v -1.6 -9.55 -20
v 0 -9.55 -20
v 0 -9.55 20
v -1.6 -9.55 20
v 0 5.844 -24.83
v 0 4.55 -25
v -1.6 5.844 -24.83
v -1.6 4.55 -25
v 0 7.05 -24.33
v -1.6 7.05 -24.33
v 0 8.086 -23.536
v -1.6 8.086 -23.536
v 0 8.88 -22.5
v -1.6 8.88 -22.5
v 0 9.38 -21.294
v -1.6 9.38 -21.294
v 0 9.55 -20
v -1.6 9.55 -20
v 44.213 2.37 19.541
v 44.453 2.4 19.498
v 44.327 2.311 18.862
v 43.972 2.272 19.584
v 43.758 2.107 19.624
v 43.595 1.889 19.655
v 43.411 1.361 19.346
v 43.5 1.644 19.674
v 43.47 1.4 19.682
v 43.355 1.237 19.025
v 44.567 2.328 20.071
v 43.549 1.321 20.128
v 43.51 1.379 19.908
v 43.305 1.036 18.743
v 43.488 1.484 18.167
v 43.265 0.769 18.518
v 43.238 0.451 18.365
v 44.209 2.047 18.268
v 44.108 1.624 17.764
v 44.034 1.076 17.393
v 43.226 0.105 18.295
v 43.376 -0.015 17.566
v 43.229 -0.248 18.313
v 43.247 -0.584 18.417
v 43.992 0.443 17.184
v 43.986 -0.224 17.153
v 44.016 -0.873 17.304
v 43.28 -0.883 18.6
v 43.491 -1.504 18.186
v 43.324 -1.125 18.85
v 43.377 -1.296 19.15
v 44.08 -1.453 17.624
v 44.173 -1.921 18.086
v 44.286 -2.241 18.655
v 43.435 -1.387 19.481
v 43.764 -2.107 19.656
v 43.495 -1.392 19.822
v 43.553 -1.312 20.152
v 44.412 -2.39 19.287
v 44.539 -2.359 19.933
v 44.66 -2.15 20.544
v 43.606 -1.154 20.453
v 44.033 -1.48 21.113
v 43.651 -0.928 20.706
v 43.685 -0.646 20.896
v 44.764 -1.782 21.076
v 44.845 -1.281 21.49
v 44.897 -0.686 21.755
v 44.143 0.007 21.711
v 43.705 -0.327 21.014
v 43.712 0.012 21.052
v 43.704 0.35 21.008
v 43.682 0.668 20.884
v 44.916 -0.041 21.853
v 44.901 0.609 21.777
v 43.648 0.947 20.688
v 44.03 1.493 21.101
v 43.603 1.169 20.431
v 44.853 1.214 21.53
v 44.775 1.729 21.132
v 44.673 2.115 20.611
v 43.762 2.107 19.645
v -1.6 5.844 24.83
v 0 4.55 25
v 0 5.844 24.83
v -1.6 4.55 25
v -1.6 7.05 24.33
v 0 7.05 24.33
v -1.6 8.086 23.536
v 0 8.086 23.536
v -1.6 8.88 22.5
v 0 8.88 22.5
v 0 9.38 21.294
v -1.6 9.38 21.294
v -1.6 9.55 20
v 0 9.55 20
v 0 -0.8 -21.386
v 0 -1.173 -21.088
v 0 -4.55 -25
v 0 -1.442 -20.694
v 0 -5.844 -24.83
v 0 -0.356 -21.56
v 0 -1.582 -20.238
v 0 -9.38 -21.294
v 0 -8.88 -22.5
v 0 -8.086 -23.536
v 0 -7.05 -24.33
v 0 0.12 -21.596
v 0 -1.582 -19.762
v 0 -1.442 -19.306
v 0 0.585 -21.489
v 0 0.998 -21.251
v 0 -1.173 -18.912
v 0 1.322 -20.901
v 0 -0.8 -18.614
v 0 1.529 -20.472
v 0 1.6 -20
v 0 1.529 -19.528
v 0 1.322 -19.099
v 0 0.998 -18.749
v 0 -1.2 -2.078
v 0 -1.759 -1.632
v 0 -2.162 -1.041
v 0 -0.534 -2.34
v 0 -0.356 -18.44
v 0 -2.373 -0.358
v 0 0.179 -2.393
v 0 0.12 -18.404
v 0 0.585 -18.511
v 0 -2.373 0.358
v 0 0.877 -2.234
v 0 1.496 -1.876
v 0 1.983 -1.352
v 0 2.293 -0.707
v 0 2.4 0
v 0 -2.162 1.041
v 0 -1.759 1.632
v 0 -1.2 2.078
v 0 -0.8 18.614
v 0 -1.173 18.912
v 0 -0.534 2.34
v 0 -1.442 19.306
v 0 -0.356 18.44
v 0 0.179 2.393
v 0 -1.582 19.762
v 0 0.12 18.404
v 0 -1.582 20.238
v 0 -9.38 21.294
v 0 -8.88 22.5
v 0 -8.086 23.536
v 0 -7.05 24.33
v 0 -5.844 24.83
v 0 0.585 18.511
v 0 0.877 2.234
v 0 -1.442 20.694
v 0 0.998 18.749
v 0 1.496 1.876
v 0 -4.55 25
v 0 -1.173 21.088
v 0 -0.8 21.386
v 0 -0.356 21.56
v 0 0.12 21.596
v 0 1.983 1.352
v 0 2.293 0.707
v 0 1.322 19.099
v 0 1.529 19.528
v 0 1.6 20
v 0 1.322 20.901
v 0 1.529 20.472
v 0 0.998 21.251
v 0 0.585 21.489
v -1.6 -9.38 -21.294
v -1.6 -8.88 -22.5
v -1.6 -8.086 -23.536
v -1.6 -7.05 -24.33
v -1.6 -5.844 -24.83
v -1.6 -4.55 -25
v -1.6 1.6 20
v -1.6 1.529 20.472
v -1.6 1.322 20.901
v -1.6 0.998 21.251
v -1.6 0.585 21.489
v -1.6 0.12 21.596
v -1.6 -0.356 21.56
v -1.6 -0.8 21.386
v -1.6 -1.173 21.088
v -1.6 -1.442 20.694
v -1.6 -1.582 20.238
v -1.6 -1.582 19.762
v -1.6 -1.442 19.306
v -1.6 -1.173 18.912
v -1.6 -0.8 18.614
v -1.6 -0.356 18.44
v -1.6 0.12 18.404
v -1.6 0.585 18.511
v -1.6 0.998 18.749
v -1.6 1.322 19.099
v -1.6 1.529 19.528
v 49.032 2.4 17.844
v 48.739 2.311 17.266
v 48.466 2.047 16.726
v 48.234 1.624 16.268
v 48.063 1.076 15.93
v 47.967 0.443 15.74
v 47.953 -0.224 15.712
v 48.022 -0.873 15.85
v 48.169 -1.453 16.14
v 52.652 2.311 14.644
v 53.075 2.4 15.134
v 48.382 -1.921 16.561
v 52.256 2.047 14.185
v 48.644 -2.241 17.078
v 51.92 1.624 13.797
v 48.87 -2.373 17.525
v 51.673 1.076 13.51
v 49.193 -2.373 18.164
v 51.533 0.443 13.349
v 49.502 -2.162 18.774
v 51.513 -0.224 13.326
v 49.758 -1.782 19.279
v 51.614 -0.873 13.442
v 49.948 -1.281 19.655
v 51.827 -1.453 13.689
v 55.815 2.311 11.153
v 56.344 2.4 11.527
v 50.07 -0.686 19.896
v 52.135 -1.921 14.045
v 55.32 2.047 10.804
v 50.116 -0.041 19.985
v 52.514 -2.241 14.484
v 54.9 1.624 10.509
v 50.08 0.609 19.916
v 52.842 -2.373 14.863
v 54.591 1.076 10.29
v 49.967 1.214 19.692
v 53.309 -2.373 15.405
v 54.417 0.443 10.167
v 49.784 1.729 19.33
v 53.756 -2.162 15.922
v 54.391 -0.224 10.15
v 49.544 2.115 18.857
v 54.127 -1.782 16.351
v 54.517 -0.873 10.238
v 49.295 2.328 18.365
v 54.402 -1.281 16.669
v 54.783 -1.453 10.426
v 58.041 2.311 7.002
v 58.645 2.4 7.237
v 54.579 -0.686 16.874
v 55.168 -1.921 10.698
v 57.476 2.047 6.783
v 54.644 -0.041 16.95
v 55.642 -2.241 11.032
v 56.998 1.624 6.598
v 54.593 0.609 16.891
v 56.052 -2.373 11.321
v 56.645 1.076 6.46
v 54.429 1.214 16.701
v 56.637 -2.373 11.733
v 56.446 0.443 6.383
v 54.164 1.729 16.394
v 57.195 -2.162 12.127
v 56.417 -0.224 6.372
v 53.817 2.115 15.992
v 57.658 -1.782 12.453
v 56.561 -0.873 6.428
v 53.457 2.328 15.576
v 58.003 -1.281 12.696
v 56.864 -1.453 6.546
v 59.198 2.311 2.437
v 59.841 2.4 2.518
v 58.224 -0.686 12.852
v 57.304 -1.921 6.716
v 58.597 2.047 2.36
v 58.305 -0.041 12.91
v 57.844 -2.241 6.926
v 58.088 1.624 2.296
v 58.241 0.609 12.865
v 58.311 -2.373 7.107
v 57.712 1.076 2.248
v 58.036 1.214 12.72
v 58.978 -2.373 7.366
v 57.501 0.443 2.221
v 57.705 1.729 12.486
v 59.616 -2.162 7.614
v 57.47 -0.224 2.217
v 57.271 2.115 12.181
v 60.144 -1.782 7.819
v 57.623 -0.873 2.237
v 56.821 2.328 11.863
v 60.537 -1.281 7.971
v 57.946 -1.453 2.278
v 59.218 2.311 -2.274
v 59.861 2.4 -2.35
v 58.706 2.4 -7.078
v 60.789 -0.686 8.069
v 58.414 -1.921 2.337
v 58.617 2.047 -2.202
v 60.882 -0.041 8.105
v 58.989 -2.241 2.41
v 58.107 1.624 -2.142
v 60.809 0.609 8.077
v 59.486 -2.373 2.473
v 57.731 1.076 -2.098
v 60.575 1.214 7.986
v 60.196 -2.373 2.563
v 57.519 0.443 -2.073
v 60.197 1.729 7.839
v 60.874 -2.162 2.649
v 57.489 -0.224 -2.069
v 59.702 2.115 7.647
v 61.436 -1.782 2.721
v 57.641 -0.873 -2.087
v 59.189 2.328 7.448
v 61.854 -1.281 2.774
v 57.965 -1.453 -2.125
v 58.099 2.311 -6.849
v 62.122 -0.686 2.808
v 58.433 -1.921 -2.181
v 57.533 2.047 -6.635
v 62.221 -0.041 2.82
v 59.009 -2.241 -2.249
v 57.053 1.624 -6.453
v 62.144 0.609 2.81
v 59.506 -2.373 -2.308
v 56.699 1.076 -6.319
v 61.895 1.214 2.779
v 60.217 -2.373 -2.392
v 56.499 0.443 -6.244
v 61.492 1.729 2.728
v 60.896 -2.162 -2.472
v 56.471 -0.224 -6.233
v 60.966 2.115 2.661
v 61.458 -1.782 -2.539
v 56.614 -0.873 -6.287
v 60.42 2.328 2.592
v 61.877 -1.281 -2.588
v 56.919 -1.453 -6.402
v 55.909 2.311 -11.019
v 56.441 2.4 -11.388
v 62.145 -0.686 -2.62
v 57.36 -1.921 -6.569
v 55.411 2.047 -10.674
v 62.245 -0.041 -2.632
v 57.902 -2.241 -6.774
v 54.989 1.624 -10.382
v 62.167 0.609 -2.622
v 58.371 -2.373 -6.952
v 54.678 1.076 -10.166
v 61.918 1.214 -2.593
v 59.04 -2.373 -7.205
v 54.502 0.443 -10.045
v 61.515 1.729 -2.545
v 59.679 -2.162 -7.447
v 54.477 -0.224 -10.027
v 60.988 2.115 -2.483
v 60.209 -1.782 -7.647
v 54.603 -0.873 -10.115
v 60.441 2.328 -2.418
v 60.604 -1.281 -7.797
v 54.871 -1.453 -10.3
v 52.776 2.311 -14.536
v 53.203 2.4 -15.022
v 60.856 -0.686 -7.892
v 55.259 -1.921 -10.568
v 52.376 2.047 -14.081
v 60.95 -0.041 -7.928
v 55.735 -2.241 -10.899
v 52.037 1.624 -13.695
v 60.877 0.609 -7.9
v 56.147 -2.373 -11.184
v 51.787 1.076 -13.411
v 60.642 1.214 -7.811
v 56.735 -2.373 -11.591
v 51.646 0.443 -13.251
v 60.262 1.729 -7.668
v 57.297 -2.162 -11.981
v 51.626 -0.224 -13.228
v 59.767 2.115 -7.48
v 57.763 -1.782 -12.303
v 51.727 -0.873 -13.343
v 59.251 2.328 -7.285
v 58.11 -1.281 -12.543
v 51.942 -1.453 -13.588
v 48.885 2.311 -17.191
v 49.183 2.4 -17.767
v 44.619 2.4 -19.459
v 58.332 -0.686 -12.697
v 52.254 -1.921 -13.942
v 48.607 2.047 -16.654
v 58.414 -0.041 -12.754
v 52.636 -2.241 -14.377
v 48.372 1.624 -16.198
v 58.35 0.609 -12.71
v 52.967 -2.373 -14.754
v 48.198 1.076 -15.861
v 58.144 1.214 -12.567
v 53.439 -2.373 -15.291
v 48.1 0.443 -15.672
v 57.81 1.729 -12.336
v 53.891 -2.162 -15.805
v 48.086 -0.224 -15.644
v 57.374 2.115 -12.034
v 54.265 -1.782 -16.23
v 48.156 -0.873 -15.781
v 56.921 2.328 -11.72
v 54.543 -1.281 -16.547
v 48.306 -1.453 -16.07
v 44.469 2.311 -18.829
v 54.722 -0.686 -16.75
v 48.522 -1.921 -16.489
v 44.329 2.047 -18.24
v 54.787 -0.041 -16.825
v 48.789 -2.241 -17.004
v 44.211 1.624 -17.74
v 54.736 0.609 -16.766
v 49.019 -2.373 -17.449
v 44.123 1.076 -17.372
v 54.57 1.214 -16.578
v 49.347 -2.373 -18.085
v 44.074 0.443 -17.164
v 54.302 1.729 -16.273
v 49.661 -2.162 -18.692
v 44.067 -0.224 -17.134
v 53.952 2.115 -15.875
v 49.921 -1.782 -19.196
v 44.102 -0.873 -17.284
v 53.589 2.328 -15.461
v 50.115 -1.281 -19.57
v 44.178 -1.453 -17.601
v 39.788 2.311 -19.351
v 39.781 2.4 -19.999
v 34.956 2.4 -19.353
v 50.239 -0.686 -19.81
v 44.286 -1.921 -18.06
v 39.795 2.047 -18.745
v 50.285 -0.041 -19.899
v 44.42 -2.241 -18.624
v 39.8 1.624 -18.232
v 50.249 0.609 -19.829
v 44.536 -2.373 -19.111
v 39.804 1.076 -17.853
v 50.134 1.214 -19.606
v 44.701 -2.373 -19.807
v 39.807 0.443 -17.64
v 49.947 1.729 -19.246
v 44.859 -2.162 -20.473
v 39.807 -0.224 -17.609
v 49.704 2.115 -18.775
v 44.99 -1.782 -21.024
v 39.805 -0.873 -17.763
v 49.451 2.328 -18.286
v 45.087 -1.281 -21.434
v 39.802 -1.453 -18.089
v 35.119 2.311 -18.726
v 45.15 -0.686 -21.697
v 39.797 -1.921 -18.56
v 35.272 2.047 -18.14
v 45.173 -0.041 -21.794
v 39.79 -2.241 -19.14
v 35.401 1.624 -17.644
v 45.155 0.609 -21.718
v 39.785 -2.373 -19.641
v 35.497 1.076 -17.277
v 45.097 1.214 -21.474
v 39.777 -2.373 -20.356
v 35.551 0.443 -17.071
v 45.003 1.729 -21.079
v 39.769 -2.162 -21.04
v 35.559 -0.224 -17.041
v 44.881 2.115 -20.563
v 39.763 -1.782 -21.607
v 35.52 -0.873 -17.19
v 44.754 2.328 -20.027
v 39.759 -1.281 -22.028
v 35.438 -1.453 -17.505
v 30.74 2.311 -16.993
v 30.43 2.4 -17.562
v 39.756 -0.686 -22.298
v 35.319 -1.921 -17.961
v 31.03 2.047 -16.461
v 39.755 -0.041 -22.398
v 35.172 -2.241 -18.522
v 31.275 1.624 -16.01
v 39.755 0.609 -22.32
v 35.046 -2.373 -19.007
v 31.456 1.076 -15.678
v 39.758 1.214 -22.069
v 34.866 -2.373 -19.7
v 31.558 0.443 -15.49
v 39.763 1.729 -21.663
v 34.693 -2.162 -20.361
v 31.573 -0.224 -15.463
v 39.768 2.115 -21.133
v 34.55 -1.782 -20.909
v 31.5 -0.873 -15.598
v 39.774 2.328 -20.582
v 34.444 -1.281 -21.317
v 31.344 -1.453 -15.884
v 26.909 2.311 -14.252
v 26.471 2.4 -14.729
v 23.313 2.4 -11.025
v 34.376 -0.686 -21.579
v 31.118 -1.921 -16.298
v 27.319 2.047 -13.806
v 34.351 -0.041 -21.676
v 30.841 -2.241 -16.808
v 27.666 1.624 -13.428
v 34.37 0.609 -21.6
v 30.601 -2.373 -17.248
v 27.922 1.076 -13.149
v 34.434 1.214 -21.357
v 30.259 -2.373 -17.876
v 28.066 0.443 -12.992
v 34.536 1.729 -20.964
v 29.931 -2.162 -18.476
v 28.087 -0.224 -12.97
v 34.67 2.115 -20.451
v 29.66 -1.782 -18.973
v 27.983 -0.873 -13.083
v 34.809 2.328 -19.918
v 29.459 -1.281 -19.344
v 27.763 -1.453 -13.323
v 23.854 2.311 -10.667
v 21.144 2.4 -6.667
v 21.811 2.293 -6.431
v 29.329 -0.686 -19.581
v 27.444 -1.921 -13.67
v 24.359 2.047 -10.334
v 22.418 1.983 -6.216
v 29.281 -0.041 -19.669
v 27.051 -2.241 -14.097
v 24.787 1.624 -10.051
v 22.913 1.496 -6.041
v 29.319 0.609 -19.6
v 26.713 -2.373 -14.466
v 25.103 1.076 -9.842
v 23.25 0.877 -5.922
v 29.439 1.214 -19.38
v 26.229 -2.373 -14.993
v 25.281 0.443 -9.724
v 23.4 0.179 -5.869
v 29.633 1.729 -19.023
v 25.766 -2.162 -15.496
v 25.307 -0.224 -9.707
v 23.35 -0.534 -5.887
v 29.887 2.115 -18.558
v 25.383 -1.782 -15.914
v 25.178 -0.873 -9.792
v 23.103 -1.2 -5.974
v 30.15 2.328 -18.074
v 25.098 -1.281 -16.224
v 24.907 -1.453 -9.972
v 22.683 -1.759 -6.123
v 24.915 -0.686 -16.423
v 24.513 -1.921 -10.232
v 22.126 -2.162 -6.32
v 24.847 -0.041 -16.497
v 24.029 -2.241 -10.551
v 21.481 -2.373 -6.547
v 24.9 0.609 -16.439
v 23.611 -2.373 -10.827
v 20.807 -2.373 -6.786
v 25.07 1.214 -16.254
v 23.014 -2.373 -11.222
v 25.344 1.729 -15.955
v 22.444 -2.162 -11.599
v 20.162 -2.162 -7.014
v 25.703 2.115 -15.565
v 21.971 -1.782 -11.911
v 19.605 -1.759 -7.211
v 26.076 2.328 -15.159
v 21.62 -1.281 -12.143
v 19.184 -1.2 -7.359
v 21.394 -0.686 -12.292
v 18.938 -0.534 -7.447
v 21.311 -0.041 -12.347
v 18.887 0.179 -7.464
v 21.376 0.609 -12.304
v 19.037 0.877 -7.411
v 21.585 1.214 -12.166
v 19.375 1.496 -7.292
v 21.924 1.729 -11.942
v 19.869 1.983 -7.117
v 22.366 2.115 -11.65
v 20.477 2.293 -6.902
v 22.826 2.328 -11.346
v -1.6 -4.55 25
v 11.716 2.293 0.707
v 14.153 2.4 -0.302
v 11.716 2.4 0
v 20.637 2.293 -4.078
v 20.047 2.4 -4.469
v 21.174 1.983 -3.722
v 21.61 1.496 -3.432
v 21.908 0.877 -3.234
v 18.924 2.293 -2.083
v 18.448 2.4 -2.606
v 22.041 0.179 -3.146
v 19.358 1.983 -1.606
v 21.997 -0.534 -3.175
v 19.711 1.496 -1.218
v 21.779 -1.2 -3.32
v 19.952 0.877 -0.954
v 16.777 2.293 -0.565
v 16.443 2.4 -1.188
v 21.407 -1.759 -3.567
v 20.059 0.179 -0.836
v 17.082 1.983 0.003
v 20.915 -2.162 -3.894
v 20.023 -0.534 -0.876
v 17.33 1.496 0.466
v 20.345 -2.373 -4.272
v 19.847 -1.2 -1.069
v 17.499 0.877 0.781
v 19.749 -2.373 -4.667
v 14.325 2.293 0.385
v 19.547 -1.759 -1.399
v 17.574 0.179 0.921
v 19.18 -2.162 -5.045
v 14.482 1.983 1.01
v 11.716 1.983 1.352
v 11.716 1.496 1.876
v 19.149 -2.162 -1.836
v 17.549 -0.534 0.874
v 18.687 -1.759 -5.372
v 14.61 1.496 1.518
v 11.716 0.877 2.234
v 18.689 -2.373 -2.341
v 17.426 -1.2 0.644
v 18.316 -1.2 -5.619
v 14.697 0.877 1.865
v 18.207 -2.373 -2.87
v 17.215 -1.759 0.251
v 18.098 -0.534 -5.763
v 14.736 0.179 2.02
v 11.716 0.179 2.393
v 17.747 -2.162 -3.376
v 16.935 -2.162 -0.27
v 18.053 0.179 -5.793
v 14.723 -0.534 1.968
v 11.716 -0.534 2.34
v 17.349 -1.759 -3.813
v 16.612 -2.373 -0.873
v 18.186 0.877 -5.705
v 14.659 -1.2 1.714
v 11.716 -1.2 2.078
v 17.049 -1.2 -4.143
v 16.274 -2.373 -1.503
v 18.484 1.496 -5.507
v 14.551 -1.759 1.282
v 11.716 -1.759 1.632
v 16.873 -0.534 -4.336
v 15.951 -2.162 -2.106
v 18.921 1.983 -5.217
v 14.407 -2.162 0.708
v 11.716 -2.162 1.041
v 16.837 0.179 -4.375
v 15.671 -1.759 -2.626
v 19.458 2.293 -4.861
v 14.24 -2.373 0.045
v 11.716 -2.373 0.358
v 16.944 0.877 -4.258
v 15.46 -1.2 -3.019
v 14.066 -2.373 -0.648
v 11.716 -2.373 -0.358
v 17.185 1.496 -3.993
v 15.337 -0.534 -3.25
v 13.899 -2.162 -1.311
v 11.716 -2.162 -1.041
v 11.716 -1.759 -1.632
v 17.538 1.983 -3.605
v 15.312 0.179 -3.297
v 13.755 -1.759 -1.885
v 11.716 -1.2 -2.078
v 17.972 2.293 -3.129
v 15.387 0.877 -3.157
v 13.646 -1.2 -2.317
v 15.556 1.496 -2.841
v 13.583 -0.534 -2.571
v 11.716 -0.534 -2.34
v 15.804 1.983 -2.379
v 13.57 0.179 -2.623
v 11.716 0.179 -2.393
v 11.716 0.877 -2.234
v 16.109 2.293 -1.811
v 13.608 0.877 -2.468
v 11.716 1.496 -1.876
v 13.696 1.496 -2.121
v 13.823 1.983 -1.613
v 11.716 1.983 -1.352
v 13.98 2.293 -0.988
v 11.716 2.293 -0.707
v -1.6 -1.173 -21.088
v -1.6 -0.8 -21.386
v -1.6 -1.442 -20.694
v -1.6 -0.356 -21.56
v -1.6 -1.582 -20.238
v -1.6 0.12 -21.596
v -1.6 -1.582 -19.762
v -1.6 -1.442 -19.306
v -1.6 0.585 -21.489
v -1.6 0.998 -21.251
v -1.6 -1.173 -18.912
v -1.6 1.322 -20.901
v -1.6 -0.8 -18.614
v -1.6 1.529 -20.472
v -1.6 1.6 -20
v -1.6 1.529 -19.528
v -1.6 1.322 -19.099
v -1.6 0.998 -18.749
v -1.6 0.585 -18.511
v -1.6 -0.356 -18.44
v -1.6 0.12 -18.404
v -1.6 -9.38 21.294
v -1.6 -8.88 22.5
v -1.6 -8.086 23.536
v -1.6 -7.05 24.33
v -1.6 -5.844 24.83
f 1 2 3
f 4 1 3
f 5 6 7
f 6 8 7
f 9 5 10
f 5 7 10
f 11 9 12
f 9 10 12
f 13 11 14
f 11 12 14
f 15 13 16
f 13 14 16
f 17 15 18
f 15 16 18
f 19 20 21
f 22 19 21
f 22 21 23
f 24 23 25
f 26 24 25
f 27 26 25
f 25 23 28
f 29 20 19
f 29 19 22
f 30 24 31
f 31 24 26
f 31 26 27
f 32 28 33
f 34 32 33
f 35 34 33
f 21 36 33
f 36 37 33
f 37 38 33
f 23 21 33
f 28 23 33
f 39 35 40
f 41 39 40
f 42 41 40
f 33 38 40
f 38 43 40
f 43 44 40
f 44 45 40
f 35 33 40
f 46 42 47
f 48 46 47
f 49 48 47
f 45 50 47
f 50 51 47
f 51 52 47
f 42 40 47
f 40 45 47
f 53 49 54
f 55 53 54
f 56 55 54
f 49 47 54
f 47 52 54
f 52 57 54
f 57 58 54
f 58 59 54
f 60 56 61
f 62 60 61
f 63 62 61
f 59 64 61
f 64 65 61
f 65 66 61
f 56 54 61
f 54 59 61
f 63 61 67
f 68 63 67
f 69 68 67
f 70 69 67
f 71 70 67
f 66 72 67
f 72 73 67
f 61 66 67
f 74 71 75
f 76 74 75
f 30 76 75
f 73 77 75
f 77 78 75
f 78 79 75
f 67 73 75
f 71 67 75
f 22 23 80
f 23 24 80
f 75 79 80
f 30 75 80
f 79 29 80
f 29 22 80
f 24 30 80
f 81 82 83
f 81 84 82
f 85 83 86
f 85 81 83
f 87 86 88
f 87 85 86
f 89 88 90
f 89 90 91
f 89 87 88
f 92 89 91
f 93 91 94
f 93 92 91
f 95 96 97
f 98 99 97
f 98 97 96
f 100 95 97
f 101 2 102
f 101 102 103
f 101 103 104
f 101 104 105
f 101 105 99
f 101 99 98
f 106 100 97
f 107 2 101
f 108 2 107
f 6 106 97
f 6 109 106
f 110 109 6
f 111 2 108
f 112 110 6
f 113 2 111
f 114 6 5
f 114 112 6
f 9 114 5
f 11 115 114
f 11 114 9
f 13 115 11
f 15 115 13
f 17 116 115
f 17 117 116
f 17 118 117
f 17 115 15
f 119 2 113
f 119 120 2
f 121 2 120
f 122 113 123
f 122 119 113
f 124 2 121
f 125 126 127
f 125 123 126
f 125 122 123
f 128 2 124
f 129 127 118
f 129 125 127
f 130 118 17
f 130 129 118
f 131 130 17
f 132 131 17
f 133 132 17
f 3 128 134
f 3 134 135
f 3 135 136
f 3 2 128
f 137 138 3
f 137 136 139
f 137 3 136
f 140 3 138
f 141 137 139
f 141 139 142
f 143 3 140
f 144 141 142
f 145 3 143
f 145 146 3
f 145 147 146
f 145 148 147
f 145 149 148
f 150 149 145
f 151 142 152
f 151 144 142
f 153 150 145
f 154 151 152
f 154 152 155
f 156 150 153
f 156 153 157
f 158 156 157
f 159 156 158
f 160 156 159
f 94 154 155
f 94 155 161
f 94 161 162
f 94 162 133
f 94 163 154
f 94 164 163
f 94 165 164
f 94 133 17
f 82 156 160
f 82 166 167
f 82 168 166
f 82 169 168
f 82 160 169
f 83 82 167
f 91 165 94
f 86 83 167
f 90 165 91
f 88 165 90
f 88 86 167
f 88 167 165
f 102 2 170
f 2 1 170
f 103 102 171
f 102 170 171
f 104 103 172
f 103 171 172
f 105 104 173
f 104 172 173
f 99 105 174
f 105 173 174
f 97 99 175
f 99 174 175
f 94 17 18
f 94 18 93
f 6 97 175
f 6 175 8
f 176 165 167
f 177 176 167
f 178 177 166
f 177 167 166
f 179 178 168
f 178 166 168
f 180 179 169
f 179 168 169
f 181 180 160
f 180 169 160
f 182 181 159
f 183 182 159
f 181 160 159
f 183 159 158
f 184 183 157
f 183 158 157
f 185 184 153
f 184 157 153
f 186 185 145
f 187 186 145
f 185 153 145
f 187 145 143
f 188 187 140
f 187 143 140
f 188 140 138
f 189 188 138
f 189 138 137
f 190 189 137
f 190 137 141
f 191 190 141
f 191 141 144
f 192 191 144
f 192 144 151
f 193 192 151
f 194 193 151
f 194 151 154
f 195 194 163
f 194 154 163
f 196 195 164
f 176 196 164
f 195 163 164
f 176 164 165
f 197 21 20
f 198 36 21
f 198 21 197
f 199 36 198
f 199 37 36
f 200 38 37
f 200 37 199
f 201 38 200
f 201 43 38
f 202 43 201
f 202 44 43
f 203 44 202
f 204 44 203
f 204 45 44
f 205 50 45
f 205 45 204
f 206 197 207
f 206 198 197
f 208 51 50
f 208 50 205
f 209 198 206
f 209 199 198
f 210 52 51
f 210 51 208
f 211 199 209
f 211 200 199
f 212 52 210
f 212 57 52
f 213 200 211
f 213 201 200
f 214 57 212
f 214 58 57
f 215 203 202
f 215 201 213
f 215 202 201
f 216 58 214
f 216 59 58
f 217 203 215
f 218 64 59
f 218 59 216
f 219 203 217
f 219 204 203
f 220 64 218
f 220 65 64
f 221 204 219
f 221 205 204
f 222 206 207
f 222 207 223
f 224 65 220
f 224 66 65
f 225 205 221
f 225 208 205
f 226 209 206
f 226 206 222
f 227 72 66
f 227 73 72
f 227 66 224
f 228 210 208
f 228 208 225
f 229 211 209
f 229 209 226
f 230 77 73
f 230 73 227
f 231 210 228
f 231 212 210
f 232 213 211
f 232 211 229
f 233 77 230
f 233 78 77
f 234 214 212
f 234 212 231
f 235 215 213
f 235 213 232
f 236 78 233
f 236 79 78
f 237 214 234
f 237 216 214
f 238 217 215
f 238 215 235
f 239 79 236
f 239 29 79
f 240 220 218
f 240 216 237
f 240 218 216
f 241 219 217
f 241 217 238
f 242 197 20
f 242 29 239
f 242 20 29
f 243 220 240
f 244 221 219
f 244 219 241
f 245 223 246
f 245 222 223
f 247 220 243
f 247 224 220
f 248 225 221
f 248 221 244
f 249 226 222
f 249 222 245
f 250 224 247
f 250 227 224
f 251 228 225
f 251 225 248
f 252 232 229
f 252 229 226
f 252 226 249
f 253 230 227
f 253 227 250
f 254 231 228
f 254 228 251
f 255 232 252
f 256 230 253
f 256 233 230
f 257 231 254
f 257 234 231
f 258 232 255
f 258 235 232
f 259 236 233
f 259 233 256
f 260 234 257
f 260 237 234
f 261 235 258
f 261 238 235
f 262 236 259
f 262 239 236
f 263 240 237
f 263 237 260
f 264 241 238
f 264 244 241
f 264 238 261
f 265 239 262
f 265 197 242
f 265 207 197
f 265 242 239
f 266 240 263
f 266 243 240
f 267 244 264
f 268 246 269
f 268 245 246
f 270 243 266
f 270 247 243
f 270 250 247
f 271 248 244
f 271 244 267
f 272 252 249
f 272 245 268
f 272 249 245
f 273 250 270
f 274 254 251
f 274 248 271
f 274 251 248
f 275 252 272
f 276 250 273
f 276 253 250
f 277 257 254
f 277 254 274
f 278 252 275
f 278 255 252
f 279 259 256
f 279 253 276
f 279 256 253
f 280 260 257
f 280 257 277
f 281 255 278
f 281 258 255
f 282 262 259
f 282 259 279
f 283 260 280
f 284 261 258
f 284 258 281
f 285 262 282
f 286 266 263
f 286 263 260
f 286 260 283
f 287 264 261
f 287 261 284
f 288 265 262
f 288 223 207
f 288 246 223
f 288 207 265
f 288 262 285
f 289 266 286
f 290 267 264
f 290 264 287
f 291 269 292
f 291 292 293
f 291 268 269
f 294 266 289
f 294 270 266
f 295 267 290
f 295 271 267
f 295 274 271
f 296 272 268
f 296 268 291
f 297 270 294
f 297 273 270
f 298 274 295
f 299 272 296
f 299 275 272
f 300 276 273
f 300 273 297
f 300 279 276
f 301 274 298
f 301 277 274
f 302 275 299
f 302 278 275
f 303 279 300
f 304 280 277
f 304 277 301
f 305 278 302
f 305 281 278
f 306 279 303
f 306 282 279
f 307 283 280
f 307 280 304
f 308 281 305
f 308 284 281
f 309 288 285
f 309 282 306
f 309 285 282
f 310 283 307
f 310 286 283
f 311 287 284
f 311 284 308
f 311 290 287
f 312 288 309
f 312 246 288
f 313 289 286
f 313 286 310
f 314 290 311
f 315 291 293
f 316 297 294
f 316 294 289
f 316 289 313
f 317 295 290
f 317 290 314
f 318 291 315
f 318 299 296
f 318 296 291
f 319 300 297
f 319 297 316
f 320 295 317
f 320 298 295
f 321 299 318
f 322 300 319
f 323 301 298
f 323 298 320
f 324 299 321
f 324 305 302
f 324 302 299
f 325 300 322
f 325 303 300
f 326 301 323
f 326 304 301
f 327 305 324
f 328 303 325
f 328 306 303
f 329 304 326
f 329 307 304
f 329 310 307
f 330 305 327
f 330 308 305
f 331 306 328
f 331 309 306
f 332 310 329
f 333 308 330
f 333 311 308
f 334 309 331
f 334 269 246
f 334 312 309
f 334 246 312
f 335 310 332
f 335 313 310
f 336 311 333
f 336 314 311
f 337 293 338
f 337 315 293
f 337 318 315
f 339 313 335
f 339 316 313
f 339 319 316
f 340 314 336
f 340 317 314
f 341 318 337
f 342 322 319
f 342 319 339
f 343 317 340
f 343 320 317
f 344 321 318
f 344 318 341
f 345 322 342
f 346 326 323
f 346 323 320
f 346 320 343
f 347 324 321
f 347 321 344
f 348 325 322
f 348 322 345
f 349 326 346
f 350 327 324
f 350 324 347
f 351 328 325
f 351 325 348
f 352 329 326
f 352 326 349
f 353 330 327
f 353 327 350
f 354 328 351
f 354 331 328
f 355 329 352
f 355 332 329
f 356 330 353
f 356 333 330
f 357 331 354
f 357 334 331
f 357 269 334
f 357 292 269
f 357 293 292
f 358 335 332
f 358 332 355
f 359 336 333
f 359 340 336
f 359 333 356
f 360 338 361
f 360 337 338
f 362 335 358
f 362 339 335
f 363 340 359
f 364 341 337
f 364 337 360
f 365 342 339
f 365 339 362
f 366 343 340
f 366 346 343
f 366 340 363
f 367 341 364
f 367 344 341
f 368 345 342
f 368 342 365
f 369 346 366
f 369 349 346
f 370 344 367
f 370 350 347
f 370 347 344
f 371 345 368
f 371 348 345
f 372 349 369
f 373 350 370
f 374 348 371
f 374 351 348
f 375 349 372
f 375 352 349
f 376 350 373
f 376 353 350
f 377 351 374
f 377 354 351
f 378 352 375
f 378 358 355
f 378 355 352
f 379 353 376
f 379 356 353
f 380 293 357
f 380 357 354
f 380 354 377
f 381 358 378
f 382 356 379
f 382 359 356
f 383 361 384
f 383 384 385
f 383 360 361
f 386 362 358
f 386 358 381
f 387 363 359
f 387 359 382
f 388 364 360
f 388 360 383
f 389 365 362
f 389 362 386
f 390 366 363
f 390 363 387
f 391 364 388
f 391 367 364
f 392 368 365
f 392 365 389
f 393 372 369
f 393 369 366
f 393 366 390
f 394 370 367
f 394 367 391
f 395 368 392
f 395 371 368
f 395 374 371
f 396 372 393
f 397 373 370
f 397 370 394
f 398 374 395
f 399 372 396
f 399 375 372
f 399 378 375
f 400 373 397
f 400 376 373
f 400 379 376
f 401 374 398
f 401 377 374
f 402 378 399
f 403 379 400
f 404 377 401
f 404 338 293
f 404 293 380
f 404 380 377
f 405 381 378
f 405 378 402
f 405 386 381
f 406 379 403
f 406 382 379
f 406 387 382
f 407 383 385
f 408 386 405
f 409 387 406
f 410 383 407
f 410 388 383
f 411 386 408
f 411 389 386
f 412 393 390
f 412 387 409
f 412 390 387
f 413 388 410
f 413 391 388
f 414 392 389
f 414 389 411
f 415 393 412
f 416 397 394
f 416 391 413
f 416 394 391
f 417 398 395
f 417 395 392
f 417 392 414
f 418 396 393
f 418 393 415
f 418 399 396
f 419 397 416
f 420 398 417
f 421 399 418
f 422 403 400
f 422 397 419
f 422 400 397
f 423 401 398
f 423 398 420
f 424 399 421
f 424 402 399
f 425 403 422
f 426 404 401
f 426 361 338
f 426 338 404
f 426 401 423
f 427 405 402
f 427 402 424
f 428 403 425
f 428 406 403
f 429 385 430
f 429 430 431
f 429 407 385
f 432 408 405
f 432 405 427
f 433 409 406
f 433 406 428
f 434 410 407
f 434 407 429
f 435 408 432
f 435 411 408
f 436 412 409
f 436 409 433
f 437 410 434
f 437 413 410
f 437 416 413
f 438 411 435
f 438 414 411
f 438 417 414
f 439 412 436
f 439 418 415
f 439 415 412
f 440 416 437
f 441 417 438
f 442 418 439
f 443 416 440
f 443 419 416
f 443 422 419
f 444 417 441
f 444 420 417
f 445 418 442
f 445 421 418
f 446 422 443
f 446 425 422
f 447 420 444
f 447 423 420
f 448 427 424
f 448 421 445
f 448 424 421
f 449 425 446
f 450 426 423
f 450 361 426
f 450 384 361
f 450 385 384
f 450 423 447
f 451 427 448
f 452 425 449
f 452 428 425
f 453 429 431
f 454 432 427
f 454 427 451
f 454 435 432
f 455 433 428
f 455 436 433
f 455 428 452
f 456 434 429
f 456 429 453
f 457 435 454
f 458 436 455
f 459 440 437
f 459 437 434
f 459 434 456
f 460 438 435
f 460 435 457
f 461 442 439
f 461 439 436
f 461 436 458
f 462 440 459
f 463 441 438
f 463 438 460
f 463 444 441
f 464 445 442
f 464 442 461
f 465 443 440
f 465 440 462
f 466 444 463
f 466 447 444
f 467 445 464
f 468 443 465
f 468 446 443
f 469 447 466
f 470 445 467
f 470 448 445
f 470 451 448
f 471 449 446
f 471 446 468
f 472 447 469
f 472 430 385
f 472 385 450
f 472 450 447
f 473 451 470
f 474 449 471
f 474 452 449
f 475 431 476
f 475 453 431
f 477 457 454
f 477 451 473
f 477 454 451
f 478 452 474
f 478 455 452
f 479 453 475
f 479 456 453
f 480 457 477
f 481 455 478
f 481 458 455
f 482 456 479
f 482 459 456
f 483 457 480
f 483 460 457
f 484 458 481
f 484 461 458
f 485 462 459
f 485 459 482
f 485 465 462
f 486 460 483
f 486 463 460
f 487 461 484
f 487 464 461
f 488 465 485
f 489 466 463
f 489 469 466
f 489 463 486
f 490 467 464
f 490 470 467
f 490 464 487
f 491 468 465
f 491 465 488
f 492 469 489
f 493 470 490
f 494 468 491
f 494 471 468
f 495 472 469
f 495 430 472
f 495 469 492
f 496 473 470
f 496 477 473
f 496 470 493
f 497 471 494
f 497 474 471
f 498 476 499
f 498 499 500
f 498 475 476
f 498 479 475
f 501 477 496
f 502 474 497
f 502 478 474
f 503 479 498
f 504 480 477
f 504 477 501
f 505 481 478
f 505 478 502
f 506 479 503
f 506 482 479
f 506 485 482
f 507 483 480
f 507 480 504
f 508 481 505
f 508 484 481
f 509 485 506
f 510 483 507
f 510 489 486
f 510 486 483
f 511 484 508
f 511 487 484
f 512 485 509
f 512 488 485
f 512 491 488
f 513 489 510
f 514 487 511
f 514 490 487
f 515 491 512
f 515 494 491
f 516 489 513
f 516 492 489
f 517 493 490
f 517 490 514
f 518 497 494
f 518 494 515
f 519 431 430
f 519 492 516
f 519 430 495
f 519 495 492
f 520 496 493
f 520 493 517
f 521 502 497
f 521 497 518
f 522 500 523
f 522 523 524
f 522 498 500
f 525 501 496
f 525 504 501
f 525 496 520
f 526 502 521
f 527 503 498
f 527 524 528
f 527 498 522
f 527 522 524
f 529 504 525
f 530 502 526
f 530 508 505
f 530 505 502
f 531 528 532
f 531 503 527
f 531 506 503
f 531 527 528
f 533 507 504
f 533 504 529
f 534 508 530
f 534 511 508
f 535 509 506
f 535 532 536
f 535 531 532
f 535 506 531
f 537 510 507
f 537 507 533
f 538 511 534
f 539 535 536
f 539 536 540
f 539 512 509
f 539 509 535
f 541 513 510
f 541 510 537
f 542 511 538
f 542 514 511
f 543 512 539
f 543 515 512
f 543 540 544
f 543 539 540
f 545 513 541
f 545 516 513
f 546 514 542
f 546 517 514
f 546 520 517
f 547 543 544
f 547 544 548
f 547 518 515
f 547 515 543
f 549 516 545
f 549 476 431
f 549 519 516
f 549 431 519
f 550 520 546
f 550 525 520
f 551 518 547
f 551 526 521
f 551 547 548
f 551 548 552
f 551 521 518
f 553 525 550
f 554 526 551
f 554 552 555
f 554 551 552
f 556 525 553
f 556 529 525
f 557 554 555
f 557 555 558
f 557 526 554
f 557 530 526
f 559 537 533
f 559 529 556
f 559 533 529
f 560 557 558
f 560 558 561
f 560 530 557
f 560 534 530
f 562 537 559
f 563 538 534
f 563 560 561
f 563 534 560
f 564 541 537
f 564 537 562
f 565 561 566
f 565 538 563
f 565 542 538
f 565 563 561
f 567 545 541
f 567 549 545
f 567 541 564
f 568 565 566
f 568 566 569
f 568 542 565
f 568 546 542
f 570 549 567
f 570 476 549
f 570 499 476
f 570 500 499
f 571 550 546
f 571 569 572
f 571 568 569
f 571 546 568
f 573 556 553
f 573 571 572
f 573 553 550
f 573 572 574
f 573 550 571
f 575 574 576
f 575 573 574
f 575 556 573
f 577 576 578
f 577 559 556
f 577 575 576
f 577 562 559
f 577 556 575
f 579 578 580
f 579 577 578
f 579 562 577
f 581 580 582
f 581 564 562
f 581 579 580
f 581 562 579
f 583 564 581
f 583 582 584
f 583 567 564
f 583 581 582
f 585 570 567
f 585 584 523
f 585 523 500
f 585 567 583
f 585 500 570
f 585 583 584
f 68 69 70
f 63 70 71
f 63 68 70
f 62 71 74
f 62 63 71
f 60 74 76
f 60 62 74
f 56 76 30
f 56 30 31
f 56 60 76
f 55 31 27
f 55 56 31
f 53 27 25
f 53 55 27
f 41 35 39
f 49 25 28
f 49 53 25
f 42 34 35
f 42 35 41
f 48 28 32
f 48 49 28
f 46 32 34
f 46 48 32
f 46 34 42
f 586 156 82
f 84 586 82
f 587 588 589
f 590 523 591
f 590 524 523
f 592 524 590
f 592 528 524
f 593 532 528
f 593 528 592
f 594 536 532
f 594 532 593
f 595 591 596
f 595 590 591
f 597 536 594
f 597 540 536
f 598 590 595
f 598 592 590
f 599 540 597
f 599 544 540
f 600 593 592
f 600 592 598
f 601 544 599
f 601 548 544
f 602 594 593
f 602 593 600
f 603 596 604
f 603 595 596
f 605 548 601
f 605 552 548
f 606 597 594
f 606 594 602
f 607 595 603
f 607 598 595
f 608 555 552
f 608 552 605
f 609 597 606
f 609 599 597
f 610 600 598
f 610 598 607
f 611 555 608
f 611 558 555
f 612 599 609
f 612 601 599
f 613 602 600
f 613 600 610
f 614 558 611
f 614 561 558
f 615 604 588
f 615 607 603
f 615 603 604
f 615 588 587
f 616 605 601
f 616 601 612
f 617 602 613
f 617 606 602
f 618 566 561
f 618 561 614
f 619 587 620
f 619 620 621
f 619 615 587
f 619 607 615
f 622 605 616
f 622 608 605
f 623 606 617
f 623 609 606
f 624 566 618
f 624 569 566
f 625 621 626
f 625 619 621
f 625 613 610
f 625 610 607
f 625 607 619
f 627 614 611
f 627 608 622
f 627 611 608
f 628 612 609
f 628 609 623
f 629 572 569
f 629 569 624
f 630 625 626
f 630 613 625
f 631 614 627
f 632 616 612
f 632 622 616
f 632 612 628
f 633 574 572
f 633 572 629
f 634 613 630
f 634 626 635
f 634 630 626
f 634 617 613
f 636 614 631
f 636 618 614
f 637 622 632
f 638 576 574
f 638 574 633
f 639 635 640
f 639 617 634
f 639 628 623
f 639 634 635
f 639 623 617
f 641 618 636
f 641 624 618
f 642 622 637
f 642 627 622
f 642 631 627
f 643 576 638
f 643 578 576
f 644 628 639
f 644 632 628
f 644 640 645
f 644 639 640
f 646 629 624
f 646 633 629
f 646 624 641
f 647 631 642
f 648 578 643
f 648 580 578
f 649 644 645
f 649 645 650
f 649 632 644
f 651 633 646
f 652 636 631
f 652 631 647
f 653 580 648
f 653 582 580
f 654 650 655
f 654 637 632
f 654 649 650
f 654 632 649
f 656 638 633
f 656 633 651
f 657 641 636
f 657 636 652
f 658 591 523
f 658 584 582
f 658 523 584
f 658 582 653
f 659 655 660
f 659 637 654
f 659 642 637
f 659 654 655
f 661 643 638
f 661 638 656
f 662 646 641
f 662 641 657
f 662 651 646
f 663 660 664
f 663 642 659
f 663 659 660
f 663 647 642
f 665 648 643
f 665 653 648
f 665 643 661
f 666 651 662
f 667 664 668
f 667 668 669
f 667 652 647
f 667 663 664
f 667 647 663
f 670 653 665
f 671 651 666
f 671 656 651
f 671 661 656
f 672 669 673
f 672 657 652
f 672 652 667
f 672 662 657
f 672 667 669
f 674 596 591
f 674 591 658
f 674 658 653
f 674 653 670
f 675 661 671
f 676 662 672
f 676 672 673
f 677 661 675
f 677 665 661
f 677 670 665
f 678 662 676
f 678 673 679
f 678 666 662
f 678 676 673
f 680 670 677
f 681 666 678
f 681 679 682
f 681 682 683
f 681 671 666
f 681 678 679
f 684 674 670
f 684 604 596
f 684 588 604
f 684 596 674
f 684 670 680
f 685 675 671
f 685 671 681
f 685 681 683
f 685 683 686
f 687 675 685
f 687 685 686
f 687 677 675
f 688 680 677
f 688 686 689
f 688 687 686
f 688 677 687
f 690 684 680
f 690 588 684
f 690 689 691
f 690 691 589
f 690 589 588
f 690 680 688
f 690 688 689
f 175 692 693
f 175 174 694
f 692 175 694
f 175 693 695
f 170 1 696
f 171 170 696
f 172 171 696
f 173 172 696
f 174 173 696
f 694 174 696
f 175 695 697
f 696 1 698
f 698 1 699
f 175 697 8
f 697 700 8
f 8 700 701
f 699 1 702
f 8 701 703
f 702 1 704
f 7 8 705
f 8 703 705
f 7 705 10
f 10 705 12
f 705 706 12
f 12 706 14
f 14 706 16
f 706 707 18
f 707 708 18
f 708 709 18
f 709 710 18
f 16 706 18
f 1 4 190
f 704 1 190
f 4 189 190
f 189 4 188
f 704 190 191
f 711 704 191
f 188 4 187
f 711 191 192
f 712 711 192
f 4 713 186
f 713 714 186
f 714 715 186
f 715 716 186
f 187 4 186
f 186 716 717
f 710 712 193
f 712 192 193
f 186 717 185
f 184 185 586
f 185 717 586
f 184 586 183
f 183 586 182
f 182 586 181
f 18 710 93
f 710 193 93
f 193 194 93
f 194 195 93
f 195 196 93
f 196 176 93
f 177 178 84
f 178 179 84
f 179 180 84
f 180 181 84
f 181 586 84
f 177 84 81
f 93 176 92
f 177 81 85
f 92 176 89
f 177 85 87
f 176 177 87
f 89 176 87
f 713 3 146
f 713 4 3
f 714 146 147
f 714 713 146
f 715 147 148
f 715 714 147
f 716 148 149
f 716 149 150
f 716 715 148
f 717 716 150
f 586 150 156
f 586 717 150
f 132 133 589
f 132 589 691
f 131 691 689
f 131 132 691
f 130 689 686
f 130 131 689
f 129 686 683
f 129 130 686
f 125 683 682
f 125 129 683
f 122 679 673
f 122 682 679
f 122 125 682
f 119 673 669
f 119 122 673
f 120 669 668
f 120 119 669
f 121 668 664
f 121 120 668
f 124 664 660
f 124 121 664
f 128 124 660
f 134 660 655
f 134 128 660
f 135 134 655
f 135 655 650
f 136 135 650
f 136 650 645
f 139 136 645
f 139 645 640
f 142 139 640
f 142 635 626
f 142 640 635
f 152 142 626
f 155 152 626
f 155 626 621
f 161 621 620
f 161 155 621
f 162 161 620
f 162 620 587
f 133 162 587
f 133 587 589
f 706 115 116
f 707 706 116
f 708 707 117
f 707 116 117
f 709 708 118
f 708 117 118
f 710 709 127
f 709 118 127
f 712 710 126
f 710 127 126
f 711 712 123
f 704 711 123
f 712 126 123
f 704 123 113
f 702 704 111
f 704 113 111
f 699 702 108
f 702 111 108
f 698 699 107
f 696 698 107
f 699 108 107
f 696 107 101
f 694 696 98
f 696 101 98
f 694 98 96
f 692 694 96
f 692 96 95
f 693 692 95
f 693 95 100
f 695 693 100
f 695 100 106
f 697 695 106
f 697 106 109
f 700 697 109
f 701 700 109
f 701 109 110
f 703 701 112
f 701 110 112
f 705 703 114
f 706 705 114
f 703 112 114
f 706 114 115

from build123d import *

# Parameters (mm, degrees)
F1_R     = 2.4
F3_W     = 19.1
F3_H     = 50
F3_R     = 1.6
F4_DEPTH = 1.6
F5_R     = 5
F6_R     = 1


with BuildPart() as f2:
    # F2: sweep along a path in F0
    with BuildLine(Plane.XZ) as f2_path:
        ThreePointArc((43.4729635533, 19.6961550602), (55.2614034679, -12.9263128614), (21.1438191684, -6.6666666667))
        ThreePointArc((21.1438191684, -6.6666666667), (17.4892314444, -1.8350341907), (11.7157287525, 0))
        Line((11.7157287525, 0), (0, 0))
    # F1 (on Right) → F2 (sweep)
    with BuildSketch(Plane.YZ):
        Circle(F1_R)
    sweep(path=f2_path.line)

    # F3 (on Right) → F4 (join)
    with BuildSketch(Plane.YZ):
        Rectangle(F3_W, F3_H)
        with Locations((0, -20)):
            Circle(F3_R, mode=Mode.SUBTRACT)
        with Locations((0, 20)):
            Circle(F3_R, mode=Mode.SUBTRACT)
    extrude(amount=-F4_DEPTH)

    # F5
    f5_edges = [f2.edges().sort_by_distance(p)[0] for p in [
        (-0.8, -9.55, 25),
        (-0.8, 9.55, 25),
        (-0.8, -9.55, -25),
        (-0.8, 9.55, -25),
    ]]
    fillet(f5_edges, radius=F5_R)

    # F6
    f6_edges = [f2.edges().sort_by_distance(p)[0] for p in [
        (43.472964, -2.4, 19.696155),
    ]]
    fillet(f6_edges, radius=F6_R)


solid = f2.part
